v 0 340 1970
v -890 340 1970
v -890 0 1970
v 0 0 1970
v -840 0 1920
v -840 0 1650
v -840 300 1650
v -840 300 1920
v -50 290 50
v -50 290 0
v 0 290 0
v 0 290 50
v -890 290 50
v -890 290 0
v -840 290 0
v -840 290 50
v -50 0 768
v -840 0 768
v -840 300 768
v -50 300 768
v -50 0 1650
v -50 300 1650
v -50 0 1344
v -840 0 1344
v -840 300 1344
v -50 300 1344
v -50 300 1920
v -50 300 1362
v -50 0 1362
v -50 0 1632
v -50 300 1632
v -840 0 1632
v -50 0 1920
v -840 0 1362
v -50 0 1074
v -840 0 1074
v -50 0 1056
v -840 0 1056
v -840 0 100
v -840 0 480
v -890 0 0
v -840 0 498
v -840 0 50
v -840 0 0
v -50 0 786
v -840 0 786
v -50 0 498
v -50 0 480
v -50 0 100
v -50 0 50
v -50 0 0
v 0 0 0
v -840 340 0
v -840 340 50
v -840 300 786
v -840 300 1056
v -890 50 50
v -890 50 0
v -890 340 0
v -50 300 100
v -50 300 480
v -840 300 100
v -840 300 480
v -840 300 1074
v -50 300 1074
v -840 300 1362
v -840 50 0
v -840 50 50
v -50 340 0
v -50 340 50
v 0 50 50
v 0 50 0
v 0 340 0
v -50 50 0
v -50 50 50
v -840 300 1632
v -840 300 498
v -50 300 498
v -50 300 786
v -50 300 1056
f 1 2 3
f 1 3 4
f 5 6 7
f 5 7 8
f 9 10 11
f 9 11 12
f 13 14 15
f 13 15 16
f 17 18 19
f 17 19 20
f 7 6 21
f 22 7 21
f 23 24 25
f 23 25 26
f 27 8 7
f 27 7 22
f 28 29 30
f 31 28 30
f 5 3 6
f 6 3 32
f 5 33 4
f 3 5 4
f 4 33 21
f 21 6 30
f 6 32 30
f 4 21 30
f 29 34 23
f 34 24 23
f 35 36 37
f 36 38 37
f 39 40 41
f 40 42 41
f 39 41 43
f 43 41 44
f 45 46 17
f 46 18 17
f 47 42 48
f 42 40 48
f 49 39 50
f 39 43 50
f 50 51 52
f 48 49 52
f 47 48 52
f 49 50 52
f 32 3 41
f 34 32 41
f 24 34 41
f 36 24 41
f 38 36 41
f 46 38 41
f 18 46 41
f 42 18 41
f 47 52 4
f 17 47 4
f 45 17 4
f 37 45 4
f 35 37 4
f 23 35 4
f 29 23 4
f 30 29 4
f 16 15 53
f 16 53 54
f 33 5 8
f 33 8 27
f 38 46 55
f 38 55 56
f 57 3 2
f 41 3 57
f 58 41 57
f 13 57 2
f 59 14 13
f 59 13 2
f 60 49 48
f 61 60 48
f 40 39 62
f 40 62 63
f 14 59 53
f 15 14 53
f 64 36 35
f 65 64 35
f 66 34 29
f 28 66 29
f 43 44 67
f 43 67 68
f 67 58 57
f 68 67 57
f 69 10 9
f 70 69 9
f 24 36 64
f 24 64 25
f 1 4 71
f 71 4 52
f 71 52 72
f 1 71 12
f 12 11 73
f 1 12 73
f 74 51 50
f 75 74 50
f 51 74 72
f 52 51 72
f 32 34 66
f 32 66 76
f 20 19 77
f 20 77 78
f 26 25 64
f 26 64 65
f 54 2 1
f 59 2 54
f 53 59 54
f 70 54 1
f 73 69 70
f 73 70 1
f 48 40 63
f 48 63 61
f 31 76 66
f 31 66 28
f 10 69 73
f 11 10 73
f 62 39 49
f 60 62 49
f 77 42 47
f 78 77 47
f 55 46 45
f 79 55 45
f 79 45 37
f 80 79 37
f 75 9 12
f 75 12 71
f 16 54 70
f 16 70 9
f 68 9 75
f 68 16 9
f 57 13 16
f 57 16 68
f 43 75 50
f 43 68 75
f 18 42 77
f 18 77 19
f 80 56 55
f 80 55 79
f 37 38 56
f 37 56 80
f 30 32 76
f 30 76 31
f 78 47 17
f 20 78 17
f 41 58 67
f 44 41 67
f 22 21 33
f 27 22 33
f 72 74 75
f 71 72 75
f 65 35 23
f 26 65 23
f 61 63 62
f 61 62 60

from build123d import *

# Parameters (mm, degrees)
F0_W     = 890
F0_H     = 340
F1_DEPTH = 1970
F2_W     = 790
F2_H     = 50
F3_DEPTH = 350
F2_H_2   = 380
F2_H_3   = 270
F4_DEPTH = 300
F5_W     = 240
F5_H     = 50
F6_DEPTH = 895


with BuildPart() as f1:
    # F0 (on Top) → F1 (new body)
    with BuildSketch(Plane.XY):
        with Locations((-445, 170)):
            Rectangle(F0_W, F0_H)
    extrude(amount=F1_DEPTH)

    # F2 (on face) → F3 (cut)
    with BuildSketch(Plane.XZ):
        with Locations((-445, 25)):
            Rectangle(F2_W, F2_H)
    extrude(amount=-F3_DEPTH, mode=Mode.SUBTRACT)

    # F2 (on face) → F4 (cut)
    with BuildSketch(Plane.XZ):
        with Locations((-445, 290)):
            Rectangle(F2_W, F2_H_2)
        with Locations((-445, 633)):
            Rectangle(F2_W, F2_H_3)
        with Locations((-445, 921)):
            Rectangle(F2_W, F2_H_3)
        with Locations((-445, 1209)):
            Rectangle(F2_W, F2_H_3)
        with Locations((-445, 1497)):
            Rectangle(F2_W, F2_H_3)
        with Locations((-445, 1785)):
            Rectangle(F2_W, F2_H_3)
    extrude(amount=-F4_DEPTH, mode=Mode.SUBTRACT)

    # F5 (on face) → F6 (cut)
    with BuildSketch(Plane(origin=(-890, 0, 0), x_dir=(0, -1, 0), z_dir=(-1, 0, 0))):
        with Locations((-170, 25)):
            Rectangle(F5_W, F5_H)
    extrude(amount=-F6_DEPTH, mode=Mode.SUBTRACT)


solid = f1.part
